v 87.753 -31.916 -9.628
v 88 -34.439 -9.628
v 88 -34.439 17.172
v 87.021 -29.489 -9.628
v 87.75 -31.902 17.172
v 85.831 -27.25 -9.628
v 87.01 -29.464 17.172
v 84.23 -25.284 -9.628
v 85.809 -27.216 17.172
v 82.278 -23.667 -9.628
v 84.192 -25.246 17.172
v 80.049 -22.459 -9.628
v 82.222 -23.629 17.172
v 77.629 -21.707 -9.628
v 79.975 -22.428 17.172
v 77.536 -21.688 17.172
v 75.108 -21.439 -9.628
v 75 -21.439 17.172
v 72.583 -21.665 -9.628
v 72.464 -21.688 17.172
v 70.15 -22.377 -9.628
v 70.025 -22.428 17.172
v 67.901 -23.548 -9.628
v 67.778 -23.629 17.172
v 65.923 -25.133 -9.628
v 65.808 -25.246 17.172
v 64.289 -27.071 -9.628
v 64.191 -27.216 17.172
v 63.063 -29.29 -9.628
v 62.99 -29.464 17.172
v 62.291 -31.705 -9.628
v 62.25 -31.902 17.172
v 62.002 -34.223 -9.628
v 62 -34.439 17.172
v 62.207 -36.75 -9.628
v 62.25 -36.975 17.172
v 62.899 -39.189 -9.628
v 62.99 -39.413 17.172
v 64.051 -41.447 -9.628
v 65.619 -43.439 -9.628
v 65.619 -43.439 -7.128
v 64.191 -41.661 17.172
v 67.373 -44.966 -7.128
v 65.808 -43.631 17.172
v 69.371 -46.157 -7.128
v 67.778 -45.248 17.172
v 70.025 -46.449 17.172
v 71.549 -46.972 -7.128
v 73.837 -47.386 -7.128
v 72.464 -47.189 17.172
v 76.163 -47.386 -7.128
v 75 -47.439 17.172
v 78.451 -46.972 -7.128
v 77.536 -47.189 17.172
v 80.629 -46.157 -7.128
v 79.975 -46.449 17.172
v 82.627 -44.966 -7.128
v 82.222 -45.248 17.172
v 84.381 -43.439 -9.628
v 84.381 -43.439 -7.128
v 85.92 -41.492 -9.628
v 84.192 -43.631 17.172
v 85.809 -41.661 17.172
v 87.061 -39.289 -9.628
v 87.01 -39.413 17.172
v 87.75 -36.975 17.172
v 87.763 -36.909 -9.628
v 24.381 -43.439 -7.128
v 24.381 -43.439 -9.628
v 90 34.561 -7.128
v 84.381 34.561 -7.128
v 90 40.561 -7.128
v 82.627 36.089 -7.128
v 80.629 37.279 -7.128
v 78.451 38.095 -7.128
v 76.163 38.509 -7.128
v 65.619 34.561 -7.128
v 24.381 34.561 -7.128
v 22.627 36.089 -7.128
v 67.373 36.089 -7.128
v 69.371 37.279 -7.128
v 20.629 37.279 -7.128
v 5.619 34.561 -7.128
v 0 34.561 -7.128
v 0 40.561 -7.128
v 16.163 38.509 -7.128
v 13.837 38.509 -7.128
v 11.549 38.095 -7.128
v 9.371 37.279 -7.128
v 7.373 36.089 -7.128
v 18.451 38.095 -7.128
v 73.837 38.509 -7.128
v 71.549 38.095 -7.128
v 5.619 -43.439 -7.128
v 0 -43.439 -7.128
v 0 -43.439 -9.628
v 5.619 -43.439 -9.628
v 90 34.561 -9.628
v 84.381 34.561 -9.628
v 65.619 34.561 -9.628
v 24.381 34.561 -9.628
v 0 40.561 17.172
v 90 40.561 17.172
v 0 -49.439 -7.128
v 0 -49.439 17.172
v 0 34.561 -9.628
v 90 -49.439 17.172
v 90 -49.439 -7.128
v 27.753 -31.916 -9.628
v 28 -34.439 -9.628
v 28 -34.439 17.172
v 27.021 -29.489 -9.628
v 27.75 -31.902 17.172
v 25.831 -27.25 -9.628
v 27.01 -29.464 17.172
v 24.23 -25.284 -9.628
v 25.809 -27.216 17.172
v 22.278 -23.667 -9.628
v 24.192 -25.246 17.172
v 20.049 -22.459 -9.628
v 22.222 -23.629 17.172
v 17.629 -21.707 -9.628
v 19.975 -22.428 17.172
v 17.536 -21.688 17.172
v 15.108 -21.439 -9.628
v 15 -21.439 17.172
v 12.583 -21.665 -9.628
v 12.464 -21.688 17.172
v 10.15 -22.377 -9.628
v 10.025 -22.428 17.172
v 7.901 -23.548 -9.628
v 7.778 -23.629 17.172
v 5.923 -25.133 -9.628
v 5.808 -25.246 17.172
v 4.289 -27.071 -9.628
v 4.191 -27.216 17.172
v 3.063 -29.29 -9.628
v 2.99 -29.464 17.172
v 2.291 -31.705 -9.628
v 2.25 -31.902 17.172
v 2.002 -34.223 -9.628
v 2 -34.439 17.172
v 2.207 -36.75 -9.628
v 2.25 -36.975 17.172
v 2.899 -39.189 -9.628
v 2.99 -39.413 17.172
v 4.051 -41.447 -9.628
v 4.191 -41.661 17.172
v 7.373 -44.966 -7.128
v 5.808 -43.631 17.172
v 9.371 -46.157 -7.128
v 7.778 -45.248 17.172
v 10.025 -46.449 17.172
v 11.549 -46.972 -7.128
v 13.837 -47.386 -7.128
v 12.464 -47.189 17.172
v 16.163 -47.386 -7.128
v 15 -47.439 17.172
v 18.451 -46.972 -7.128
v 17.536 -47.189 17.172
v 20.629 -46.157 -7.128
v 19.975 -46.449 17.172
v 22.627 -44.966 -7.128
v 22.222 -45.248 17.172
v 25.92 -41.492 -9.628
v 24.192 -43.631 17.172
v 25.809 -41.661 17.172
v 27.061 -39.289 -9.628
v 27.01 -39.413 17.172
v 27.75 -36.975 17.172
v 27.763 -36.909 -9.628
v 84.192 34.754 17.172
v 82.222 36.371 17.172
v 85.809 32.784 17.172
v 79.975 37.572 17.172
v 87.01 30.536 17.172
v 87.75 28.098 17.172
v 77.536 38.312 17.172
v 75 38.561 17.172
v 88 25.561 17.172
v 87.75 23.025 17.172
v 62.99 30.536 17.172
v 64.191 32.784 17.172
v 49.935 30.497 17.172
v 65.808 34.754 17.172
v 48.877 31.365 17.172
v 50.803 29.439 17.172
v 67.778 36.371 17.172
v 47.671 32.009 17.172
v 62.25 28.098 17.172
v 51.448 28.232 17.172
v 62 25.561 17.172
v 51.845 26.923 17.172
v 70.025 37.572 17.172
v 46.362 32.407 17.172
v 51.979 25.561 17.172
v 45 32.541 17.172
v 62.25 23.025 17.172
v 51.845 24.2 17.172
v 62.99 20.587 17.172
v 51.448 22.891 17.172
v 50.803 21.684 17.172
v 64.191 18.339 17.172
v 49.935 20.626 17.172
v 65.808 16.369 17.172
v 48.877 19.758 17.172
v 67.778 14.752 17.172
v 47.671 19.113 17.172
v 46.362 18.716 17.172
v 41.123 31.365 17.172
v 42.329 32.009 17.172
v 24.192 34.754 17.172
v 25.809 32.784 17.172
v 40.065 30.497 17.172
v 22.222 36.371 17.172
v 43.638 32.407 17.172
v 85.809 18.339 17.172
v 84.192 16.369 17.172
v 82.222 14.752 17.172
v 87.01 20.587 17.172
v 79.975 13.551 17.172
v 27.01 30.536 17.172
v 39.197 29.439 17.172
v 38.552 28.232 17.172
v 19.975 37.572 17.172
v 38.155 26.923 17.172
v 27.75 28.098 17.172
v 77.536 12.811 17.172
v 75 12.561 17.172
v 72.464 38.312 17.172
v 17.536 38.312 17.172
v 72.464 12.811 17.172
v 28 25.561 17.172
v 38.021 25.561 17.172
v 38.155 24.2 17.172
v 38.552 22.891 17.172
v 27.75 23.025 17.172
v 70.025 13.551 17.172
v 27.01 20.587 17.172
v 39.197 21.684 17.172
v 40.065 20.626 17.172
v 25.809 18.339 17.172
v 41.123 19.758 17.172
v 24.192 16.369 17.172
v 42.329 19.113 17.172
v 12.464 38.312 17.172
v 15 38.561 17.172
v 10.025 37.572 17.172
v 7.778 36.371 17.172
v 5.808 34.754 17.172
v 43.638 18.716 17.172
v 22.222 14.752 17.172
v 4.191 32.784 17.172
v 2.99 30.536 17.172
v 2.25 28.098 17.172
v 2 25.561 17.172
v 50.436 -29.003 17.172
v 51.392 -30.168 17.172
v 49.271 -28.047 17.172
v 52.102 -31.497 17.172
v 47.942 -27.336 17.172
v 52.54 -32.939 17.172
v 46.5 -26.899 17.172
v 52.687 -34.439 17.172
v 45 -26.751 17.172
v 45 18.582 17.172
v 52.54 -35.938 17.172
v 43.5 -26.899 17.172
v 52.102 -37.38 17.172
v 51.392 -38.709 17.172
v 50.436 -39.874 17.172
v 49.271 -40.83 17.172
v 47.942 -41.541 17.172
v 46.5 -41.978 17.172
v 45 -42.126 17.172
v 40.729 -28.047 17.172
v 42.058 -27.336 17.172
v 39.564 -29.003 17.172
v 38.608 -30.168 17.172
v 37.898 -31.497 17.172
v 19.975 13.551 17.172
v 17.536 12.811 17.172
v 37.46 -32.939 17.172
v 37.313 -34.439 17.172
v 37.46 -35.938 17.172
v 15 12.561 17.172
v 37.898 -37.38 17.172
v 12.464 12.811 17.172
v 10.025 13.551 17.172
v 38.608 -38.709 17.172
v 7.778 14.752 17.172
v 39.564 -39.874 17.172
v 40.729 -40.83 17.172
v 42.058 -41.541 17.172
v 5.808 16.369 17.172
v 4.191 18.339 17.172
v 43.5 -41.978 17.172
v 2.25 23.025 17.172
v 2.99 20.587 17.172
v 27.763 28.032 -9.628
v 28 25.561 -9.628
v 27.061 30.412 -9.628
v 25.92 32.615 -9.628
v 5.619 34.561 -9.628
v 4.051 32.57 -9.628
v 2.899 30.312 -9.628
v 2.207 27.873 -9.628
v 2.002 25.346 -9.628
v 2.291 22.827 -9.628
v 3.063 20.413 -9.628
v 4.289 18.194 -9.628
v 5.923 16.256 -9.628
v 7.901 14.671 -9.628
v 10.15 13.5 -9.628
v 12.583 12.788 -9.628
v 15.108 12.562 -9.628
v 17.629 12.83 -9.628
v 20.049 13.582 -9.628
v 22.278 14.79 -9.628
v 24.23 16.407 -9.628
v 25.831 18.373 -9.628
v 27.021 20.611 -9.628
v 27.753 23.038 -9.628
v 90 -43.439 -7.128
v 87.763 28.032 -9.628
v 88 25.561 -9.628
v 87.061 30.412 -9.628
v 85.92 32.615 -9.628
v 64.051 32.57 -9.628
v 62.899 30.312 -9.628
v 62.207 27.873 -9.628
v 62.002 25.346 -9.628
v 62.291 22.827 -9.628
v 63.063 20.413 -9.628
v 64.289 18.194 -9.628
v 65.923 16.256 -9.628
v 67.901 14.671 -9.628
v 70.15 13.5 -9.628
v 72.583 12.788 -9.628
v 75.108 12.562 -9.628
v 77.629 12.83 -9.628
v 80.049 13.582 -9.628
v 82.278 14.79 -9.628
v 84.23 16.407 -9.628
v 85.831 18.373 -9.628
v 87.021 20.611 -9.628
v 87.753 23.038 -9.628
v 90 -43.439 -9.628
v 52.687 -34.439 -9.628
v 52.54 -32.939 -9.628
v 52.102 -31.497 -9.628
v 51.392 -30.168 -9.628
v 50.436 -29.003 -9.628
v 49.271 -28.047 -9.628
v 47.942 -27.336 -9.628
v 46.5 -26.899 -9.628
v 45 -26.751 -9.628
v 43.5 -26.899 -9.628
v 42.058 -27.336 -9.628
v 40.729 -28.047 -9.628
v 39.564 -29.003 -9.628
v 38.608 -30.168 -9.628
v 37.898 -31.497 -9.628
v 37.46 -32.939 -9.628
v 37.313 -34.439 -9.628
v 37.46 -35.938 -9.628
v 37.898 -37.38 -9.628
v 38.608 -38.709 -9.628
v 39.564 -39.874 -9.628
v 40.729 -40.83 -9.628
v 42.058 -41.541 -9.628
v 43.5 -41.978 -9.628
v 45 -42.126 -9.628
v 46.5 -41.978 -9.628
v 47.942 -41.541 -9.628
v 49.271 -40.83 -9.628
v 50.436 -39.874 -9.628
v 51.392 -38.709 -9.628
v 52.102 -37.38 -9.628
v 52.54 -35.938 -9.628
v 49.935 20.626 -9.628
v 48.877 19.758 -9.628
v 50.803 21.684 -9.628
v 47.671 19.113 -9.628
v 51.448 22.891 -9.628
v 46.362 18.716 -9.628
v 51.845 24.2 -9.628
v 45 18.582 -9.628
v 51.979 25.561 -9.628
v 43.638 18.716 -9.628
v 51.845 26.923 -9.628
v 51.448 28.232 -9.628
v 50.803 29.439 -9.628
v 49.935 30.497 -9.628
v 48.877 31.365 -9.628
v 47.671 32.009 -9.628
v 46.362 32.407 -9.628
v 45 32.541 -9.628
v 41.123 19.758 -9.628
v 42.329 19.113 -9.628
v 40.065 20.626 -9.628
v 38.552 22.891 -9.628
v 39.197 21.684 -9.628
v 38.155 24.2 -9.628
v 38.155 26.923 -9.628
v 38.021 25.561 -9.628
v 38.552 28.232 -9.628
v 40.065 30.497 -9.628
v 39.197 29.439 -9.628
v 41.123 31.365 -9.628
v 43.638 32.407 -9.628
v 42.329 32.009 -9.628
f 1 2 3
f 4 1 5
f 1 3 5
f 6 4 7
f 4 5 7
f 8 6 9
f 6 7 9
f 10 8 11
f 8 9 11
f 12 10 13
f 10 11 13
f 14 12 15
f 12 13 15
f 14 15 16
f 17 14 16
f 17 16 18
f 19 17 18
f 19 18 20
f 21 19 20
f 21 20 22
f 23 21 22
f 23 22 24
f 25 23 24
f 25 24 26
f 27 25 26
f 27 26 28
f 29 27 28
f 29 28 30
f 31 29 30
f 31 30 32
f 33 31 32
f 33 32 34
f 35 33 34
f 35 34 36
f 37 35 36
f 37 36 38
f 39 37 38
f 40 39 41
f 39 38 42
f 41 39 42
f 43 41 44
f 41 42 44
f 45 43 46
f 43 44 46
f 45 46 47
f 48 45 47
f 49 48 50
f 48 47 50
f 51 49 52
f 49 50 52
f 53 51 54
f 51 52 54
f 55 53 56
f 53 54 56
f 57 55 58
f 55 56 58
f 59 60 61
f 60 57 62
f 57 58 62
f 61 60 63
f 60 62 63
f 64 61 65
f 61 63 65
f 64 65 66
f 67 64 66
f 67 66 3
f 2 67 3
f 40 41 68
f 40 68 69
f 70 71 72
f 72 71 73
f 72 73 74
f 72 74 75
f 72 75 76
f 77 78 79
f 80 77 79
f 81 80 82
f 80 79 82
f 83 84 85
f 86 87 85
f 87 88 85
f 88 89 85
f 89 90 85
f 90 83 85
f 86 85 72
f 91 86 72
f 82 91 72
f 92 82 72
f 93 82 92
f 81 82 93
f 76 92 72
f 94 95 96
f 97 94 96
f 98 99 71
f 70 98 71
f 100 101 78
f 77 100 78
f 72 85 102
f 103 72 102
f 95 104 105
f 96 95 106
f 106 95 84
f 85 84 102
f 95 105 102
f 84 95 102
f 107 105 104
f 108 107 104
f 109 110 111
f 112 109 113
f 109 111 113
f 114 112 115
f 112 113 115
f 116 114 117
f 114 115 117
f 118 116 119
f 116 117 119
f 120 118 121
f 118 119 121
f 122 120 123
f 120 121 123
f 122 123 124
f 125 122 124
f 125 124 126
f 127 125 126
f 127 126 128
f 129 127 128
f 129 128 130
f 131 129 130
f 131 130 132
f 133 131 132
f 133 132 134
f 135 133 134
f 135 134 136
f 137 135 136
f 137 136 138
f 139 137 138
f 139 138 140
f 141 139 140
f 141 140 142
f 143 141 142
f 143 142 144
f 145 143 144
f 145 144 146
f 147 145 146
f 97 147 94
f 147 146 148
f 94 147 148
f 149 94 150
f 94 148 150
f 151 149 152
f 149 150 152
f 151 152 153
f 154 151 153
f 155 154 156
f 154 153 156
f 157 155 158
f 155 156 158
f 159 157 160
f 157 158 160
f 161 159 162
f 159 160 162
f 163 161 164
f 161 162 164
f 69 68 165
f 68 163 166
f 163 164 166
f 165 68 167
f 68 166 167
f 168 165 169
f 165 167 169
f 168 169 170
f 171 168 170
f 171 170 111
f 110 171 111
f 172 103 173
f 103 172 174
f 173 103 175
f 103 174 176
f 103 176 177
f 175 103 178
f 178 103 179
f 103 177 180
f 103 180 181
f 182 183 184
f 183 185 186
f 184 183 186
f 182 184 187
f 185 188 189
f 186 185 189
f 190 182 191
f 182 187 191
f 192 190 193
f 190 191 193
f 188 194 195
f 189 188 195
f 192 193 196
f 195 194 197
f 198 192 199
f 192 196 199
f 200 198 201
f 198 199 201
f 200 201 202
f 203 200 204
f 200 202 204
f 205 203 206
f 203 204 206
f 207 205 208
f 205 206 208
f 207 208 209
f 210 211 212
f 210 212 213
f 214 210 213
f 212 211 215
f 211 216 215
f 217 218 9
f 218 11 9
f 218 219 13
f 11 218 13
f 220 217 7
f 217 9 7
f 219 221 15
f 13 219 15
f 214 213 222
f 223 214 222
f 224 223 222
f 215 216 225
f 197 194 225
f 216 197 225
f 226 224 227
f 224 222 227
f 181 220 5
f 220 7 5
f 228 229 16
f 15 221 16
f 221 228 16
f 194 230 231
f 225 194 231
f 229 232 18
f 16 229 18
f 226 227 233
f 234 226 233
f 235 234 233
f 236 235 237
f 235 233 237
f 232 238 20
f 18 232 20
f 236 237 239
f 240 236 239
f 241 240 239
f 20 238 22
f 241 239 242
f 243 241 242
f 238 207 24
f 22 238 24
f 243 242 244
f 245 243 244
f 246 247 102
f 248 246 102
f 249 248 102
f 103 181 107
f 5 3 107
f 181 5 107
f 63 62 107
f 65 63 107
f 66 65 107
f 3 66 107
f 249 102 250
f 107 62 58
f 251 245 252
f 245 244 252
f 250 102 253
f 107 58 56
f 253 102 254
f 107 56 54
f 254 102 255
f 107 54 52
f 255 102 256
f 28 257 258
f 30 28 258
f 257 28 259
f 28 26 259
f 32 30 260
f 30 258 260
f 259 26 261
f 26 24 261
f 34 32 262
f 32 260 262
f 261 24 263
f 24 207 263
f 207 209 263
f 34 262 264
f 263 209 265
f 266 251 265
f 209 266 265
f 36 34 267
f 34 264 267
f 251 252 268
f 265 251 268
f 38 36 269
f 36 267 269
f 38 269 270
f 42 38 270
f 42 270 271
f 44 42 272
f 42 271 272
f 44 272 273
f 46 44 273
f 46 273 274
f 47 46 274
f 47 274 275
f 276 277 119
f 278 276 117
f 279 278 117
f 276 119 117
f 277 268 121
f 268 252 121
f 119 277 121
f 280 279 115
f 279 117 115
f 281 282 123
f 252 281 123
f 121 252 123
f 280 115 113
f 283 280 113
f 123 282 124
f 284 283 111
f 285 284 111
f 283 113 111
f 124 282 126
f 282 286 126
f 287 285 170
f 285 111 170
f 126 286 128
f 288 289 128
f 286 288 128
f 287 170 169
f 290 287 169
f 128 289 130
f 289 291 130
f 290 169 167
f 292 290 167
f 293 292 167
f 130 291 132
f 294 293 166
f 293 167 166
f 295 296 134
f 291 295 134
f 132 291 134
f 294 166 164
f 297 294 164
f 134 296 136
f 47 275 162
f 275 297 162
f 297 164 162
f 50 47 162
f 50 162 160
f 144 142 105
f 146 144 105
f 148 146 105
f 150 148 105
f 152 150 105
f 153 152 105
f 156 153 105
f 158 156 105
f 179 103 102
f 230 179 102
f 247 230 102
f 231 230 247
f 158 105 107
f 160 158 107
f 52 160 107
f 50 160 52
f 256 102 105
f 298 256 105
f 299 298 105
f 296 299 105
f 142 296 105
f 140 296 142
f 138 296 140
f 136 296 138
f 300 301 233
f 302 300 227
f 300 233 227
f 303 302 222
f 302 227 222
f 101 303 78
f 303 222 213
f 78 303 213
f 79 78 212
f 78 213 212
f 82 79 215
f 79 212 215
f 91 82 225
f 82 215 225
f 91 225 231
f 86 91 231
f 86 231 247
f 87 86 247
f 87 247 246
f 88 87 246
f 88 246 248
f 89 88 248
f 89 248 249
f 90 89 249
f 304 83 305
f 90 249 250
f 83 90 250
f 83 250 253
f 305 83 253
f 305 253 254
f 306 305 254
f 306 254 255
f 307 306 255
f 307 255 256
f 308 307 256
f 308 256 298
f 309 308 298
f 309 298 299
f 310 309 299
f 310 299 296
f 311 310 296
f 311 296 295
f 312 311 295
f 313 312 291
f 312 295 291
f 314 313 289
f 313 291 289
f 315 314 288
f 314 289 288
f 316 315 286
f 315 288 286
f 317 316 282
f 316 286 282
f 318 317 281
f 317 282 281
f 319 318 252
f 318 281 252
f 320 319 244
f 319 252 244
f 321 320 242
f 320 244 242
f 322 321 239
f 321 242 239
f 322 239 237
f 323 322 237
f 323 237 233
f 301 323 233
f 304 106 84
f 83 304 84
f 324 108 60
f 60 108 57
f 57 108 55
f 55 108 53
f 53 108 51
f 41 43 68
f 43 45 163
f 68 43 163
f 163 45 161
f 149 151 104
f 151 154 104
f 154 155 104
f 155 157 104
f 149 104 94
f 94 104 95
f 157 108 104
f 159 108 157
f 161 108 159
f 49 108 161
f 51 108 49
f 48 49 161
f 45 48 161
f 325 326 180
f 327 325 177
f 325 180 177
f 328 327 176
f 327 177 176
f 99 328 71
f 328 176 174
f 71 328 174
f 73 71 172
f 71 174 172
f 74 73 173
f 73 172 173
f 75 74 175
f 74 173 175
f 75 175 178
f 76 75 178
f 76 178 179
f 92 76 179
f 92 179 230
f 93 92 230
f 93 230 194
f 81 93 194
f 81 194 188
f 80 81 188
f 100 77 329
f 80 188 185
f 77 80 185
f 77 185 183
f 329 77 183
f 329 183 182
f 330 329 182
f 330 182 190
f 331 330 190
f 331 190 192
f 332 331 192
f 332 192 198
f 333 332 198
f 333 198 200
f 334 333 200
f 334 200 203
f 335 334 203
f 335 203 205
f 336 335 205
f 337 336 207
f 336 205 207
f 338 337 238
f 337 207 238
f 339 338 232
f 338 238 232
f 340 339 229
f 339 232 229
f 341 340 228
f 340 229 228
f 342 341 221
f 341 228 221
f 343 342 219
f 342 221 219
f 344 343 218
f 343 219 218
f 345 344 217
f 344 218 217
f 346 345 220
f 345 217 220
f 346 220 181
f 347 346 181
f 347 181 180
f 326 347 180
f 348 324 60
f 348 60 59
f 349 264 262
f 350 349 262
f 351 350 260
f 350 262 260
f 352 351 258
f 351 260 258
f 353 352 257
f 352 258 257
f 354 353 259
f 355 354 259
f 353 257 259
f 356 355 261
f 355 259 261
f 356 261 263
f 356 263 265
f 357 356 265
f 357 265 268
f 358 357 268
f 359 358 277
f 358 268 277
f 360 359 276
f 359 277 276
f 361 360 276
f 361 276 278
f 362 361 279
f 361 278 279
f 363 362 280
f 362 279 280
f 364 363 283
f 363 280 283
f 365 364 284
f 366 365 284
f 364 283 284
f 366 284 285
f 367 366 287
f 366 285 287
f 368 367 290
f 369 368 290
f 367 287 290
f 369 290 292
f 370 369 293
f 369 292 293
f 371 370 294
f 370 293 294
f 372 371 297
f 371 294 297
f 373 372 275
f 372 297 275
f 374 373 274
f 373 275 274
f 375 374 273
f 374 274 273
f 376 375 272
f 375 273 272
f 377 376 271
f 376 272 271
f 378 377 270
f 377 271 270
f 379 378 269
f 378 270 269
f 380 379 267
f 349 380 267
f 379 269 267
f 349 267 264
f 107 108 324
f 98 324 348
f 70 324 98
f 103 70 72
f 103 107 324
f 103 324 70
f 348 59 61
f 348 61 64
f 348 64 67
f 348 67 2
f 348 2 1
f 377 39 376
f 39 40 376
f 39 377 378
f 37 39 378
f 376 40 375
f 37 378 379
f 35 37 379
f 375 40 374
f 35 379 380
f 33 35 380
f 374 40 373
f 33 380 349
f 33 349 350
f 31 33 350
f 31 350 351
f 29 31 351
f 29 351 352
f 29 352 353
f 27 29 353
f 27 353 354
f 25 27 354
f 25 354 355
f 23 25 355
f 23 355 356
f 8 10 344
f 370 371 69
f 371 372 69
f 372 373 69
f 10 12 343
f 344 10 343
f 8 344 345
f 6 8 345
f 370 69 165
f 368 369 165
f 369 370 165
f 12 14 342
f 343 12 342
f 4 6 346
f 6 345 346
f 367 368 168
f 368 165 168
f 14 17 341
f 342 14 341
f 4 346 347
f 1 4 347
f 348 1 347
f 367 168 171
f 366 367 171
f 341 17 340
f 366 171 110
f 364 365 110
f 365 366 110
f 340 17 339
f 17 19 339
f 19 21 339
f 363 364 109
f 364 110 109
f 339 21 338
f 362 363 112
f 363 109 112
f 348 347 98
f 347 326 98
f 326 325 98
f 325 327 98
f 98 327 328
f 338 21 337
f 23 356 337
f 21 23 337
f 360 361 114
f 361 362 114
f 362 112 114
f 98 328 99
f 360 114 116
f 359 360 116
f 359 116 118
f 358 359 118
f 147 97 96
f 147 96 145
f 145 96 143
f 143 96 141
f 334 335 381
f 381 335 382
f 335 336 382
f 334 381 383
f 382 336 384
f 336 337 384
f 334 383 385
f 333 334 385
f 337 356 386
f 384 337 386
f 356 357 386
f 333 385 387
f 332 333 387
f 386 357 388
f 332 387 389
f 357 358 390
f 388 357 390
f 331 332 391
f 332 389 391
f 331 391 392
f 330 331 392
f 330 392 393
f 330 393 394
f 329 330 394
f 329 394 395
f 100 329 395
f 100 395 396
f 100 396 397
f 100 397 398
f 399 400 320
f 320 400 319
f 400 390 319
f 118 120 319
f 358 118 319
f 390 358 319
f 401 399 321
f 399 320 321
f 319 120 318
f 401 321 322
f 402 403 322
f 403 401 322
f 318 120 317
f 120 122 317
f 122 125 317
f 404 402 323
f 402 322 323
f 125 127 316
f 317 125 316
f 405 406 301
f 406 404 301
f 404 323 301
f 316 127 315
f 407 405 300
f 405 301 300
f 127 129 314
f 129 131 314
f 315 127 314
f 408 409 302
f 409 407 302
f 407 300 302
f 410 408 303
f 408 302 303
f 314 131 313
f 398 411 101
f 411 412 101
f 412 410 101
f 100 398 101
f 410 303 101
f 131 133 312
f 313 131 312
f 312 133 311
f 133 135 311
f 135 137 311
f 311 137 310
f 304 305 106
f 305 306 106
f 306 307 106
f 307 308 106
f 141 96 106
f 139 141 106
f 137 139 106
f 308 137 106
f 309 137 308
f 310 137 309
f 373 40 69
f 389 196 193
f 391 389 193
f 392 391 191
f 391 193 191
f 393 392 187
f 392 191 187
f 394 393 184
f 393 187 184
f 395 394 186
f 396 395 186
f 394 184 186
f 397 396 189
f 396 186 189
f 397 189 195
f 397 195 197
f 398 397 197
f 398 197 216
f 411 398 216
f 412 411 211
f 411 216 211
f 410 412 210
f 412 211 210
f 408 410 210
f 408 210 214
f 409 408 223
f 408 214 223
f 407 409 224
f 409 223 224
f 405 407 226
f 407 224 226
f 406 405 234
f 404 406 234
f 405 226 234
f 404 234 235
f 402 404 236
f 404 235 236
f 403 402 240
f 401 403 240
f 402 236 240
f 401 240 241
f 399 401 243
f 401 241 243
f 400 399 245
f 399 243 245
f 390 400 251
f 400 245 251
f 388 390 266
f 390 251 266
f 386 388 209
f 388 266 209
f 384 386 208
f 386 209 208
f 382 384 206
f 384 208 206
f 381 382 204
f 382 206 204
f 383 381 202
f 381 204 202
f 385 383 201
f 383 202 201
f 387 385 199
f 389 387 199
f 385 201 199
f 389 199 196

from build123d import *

# Parameters (mm, degrees)
F1_DEPTH = 90
F2_R     = 13
F2_R_2   = 7.687325
F2_R_3   = 6.979282
F3_DEPTH = 26.8


with BuildPart() as f1:
    # F0 (on Right) → F1 (new body)
    with BuildSketch(Plane.YZ):
        Polygon((-43.438557, -7.128176), (-43.438557, -9.628176), (34.561443, -9.628176), (34.561443, -7.128176), (40.561443, -7.128176), (40.561443, 17.171824), (-49.438557, 17.171824), (-49.438557, -7.128176), align=None)
    extrude(amount=F1_DEPTH)

    # F2 (on face) → F3 (cut, through all)
    with BuildSketch(Plane.XY.offset(17.171824)):
        with Locations((75, 25.561443)):
            Circle(F2_R)
        with Locations((15, -34.438557)):
            Circle(F2_R)
        with Locations((75, -34.438557)):
            Circle(F2_R)
        with Locations((45, -34.438557)):
            Circle(F2_R_2)
        with Locations((45, 25.561443)):
            Circle(F2_R_3)
        with Locations((15, 25.561443)):
            Circle(F2_R)
    extrude(amount=-F3_DEPTH, mode=Mode.SUBTRACT)


solid = f1.part
